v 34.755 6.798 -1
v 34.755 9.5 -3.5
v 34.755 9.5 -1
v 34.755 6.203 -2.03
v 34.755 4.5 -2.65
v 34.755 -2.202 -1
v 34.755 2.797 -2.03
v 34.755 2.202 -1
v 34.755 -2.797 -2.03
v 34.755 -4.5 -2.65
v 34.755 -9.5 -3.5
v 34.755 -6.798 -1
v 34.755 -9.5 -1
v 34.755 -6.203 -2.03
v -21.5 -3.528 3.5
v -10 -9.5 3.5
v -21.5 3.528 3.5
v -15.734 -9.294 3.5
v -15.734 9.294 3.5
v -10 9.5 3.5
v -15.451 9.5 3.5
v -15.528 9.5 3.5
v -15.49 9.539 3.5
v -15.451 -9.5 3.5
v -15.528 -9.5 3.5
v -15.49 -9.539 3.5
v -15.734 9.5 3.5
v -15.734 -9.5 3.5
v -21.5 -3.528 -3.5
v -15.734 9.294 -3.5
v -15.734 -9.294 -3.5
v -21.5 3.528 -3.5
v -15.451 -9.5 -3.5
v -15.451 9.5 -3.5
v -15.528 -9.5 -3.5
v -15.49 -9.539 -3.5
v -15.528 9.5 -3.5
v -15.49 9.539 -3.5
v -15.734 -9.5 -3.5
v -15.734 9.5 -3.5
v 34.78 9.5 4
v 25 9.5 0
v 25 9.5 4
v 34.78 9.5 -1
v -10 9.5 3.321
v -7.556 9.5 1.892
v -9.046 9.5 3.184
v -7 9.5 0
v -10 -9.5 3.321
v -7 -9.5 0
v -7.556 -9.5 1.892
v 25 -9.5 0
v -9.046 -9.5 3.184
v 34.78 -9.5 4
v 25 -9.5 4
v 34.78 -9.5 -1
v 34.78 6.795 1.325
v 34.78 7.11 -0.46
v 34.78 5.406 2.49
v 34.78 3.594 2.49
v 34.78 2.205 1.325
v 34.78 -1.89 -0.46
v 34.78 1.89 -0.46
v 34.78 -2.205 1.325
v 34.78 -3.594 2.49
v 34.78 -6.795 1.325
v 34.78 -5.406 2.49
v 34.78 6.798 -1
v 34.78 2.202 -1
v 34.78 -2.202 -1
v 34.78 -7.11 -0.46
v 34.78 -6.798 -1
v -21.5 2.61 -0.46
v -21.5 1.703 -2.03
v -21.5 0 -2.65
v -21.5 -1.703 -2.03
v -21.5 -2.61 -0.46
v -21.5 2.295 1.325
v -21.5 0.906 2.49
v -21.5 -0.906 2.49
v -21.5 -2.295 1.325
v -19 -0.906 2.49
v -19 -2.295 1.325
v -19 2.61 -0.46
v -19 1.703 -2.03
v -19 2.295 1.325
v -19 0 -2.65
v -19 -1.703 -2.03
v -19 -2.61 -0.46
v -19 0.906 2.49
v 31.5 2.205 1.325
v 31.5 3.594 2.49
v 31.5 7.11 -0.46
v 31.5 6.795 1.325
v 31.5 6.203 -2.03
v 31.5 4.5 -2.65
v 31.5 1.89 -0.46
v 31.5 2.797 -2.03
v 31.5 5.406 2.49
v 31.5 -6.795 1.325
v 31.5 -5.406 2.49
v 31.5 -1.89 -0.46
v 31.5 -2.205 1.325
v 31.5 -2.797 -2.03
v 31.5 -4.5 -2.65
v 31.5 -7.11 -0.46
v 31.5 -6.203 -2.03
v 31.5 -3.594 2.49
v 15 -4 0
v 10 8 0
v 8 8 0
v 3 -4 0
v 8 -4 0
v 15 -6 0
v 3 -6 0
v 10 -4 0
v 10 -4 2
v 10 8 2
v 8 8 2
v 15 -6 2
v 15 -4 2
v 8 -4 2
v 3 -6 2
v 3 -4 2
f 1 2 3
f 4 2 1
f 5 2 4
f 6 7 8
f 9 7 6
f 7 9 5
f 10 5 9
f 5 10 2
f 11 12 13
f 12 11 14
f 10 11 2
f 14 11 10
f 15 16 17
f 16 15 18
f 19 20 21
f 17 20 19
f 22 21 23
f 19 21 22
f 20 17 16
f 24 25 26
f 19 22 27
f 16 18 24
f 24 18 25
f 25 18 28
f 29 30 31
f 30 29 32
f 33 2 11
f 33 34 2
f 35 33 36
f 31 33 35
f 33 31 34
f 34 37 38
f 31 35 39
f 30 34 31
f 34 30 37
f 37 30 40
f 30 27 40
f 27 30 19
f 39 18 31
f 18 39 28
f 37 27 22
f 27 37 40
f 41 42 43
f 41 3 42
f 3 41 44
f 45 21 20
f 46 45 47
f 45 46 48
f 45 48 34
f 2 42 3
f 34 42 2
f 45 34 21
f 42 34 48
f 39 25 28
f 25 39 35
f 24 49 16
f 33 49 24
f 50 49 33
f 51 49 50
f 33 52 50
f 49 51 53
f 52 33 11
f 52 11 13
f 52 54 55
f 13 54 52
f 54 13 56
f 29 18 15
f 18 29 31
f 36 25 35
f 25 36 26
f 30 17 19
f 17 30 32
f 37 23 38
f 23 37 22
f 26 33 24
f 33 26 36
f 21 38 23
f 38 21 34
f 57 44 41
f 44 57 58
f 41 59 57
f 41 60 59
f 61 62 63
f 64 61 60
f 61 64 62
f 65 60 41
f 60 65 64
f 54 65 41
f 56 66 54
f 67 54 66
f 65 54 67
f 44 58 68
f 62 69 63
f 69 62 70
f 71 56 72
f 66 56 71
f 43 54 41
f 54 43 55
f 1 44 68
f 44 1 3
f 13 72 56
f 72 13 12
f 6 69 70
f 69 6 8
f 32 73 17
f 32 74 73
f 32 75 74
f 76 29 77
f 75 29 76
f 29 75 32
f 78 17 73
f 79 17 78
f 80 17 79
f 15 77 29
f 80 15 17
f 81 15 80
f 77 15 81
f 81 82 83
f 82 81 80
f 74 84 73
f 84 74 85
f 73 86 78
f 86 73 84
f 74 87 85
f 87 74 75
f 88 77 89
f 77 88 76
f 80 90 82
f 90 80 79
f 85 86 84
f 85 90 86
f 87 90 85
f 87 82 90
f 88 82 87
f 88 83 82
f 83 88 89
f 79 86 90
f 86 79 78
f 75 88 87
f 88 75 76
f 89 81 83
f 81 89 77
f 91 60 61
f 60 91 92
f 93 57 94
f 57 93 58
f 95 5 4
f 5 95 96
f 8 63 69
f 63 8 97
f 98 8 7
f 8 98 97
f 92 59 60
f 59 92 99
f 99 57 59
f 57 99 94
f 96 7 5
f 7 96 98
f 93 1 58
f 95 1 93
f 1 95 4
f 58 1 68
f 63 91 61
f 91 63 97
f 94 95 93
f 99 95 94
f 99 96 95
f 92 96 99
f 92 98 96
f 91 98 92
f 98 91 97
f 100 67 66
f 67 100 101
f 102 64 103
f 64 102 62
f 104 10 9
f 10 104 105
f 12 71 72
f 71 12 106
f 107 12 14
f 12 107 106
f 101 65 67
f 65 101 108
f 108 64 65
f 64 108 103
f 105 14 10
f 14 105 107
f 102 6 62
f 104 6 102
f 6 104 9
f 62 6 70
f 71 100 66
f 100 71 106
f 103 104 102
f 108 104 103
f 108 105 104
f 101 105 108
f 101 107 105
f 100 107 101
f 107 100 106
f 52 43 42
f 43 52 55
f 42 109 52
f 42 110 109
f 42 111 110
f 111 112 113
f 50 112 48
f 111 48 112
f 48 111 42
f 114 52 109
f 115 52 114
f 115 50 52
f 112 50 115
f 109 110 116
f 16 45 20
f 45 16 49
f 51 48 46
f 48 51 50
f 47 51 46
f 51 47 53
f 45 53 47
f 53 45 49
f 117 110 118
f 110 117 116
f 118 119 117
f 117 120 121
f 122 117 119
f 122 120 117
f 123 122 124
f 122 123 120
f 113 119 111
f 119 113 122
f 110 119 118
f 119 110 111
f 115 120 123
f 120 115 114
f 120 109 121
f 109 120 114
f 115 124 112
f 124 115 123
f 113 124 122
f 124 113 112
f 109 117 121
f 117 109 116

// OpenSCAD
//Азотистые основания: 
x=60; 
y=19; 
z=7; 
t=0; 
z2=2.5;
edge=0.71*y; 
dx=edge*1.41; 
//Тимин 
difference(){
union(){
translate ([dx/2,t,0]) { 

color() translate ([0,0,0]) cube ([x-dx/2,y,z], center=true); 

translate([-25,0,0]) color() rotate ([0,0,45]) cube ([edge,edge,z], center=true); 
} 
translate([24.78,-9.5,-1]) cube([10,19,5]);
}

translate([-32,0,0]) cube([21,21,10],center=true);

#rotate([0,90,0]) translate([0,0,-22]) cylinder(3,2.65,2.65);

#rotate([0,90,0]) translate([0,4.5,31.5]) cylinder(9,2.65,2.65);

#rotate([0,90,0]) translate([0,-4.5,31.5]) cylinder(9,2.65,2.65);

translate([-10,-10.5,0]) cube([35,21,5]);
}
//Плоскость для центрирования
//translate([4,-0.25,-10])cube([40,0.5,30])

rotate([90,0,0]) translate([-10.5,0,-9.5]) cylinder(19,3.5,3.5);


//буква Т озночает Тимин
xx=2;
e=12;
translate([8,-6,0]) cube([xx,e+2,xx]);
translate([3,-6,0]) cube([e,xx,xx]);
